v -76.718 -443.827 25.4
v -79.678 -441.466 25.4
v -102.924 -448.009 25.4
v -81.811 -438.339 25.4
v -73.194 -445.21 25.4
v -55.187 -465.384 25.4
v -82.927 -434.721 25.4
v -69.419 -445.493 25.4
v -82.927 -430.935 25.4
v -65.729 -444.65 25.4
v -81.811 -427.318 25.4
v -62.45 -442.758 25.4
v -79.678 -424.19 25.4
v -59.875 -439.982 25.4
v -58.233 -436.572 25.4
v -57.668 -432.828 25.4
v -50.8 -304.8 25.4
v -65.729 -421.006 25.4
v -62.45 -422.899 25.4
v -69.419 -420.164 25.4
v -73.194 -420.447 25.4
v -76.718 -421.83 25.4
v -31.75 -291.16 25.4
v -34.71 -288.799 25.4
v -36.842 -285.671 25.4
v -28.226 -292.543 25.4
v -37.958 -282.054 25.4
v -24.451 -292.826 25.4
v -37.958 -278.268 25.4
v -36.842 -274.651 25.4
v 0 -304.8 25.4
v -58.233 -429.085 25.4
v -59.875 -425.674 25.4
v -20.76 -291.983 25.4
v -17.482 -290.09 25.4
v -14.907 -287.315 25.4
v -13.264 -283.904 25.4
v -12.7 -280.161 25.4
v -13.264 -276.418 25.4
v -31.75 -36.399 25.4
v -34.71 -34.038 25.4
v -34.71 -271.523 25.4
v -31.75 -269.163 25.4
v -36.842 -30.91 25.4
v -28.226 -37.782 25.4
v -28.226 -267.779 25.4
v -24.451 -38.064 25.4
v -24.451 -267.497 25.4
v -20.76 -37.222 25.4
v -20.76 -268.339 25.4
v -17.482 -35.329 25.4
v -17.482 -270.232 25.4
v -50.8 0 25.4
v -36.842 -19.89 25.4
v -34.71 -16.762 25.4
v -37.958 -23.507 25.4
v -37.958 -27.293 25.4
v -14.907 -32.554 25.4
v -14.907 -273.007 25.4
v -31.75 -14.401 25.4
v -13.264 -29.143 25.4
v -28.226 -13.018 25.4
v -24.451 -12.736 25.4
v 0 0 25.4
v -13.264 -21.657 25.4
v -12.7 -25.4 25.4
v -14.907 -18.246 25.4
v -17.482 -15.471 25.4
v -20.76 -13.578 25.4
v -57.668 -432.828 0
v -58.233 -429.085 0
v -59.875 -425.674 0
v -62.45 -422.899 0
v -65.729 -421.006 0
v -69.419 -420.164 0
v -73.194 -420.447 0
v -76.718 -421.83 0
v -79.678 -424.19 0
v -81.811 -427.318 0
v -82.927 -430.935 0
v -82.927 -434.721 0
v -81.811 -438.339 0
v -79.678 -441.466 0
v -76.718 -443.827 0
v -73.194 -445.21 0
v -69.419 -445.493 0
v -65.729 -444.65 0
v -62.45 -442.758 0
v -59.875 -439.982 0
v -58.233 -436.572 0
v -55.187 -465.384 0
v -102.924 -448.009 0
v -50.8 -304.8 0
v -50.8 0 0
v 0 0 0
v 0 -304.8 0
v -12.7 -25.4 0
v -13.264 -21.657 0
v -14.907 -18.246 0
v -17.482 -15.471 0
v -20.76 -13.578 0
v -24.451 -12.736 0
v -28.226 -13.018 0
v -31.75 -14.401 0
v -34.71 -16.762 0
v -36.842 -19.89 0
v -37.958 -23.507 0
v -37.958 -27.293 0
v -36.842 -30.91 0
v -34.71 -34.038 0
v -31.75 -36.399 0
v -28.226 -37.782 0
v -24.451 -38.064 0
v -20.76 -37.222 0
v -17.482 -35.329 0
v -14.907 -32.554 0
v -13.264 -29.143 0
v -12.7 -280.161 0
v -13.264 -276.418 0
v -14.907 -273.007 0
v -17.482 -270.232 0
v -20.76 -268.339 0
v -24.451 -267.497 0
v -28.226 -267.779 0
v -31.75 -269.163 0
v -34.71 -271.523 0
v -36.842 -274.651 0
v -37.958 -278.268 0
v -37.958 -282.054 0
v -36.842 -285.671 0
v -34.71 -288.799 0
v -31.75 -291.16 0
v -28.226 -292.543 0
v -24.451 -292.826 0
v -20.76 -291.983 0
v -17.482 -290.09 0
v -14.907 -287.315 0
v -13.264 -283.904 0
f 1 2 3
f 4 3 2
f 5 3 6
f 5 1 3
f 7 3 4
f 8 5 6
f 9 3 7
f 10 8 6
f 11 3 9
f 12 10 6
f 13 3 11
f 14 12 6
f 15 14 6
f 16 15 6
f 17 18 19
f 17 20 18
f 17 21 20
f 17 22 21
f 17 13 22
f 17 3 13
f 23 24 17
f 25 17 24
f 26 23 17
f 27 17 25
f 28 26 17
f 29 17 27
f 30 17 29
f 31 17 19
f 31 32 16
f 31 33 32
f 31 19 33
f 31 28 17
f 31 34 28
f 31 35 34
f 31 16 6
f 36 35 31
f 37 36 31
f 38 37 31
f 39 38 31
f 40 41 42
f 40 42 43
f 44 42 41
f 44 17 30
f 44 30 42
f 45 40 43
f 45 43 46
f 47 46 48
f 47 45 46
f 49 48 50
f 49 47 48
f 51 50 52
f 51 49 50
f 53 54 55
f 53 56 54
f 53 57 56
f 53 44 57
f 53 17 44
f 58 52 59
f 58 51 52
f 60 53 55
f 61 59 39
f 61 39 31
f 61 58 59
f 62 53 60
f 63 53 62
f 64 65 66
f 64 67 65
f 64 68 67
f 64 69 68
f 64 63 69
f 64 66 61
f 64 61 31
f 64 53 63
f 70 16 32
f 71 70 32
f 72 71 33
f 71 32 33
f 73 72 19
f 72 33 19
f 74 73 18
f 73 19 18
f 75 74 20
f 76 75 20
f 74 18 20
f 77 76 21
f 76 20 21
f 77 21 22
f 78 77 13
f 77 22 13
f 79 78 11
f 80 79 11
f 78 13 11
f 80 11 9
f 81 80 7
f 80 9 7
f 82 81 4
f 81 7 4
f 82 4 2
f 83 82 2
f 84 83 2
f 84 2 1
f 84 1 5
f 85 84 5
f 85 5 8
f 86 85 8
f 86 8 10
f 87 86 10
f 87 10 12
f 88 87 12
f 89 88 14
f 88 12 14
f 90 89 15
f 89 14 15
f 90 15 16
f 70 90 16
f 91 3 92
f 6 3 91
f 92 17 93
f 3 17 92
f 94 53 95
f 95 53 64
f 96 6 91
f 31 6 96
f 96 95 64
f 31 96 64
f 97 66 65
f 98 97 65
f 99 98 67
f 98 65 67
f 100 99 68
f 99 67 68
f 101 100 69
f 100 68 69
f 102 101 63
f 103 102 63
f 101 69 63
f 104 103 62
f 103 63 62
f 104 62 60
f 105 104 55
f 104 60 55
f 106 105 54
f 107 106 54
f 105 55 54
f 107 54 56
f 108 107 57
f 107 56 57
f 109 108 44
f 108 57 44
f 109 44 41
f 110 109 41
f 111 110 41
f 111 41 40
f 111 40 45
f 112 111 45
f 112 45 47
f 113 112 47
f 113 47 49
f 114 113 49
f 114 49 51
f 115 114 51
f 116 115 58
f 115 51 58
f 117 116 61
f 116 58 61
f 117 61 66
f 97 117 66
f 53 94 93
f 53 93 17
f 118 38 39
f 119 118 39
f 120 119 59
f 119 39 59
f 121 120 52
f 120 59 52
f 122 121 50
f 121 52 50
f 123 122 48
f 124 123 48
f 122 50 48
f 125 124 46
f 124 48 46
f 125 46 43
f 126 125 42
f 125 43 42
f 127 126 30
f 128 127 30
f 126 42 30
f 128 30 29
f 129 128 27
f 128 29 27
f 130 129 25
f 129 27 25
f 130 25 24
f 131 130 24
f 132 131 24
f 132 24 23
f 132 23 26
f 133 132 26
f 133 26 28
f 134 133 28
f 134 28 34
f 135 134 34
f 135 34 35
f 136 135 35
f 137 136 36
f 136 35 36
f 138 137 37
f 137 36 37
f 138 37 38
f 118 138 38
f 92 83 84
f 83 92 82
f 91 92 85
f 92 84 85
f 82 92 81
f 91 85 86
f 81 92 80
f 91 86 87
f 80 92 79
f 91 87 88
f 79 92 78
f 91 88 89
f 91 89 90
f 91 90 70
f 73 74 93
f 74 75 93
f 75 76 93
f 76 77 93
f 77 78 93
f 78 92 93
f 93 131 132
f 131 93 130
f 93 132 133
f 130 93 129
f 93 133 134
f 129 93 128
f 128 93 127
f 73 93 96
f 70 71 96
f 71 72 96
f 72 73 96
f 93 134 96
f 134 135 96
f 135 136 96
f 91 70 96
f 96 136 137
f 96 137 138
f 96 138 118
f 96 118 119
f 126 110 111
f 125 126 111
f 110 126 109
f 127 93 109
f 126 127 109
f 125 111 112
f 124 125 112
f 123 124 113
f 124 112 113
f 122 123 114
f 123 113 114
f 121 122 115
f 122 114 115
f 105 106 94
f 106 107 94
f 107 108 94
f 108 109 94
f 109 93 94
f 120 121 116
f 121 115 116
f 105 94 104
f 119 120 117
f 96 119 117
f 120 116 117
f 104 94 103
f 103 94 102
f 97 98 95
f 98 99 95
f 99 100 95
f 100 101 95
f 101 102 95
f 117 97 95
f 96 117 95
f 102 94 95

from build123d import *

# Parameters (mm, degrees)
F0_W     = 50.8
F0_H     = 25.4
F1_DEPTH = 304.8
F3_DEPTH = 25.4
F4_R     = 12.7
F5_DEPTH = 25.4
F6_R     = 12.7
F7_DEPTH = 25.4
F8_R     = 12.7
F9_DEPTH = 25.4


with BuildPart() as f1:
    # F0 (on Front) → F1 (new body)
    with BuildSketch(Plane.XZ):
        with Locations((-25.4, 12.7)):
            Rectangle(F0_W, F0_H)
    extrude(amount=F1_DEPTH)

    # F2 (on face) → F3 (join)
    with BuildSketch(Plane.XY.offset(25.4)):
        Polygon((0, -304.8), (-50.8, -304.8), (-102.92387, -448.009155), (-55.187485, -465.383779), align=None)
    extrude(amount=-F3_DEPTH)

    # F4 (on face) → F5 (cut)
    with BuildSketch(Plane.XY.offset(25.4)):
        with Locations((-25.4, -25.4)):
            Circle(F4_R)
    extrude(amount=-F5_DEPTH, mode=Mode.SUBTRACT)

    # F6 (on face) → F7 (cut)
    with BuildSketch(Plane.XY.offset(25.4)):
        with Locations((-70.368366, -432.828274)):
            Circle(F6_R)
    extrude(amount=-F7_DEPTH, mode=Mode.SUBTRACT)

    # F8 (on face) → F9 (cut)
    with BuildSketch(Plane.XY.offset(25.4)):
        with Locations((-25.4, -280.161023)):
            Circle(F8_R)
    extrude(amount=-F9_DEPTH, mode=Mode.SUBTRACT)


solid = f1.part
